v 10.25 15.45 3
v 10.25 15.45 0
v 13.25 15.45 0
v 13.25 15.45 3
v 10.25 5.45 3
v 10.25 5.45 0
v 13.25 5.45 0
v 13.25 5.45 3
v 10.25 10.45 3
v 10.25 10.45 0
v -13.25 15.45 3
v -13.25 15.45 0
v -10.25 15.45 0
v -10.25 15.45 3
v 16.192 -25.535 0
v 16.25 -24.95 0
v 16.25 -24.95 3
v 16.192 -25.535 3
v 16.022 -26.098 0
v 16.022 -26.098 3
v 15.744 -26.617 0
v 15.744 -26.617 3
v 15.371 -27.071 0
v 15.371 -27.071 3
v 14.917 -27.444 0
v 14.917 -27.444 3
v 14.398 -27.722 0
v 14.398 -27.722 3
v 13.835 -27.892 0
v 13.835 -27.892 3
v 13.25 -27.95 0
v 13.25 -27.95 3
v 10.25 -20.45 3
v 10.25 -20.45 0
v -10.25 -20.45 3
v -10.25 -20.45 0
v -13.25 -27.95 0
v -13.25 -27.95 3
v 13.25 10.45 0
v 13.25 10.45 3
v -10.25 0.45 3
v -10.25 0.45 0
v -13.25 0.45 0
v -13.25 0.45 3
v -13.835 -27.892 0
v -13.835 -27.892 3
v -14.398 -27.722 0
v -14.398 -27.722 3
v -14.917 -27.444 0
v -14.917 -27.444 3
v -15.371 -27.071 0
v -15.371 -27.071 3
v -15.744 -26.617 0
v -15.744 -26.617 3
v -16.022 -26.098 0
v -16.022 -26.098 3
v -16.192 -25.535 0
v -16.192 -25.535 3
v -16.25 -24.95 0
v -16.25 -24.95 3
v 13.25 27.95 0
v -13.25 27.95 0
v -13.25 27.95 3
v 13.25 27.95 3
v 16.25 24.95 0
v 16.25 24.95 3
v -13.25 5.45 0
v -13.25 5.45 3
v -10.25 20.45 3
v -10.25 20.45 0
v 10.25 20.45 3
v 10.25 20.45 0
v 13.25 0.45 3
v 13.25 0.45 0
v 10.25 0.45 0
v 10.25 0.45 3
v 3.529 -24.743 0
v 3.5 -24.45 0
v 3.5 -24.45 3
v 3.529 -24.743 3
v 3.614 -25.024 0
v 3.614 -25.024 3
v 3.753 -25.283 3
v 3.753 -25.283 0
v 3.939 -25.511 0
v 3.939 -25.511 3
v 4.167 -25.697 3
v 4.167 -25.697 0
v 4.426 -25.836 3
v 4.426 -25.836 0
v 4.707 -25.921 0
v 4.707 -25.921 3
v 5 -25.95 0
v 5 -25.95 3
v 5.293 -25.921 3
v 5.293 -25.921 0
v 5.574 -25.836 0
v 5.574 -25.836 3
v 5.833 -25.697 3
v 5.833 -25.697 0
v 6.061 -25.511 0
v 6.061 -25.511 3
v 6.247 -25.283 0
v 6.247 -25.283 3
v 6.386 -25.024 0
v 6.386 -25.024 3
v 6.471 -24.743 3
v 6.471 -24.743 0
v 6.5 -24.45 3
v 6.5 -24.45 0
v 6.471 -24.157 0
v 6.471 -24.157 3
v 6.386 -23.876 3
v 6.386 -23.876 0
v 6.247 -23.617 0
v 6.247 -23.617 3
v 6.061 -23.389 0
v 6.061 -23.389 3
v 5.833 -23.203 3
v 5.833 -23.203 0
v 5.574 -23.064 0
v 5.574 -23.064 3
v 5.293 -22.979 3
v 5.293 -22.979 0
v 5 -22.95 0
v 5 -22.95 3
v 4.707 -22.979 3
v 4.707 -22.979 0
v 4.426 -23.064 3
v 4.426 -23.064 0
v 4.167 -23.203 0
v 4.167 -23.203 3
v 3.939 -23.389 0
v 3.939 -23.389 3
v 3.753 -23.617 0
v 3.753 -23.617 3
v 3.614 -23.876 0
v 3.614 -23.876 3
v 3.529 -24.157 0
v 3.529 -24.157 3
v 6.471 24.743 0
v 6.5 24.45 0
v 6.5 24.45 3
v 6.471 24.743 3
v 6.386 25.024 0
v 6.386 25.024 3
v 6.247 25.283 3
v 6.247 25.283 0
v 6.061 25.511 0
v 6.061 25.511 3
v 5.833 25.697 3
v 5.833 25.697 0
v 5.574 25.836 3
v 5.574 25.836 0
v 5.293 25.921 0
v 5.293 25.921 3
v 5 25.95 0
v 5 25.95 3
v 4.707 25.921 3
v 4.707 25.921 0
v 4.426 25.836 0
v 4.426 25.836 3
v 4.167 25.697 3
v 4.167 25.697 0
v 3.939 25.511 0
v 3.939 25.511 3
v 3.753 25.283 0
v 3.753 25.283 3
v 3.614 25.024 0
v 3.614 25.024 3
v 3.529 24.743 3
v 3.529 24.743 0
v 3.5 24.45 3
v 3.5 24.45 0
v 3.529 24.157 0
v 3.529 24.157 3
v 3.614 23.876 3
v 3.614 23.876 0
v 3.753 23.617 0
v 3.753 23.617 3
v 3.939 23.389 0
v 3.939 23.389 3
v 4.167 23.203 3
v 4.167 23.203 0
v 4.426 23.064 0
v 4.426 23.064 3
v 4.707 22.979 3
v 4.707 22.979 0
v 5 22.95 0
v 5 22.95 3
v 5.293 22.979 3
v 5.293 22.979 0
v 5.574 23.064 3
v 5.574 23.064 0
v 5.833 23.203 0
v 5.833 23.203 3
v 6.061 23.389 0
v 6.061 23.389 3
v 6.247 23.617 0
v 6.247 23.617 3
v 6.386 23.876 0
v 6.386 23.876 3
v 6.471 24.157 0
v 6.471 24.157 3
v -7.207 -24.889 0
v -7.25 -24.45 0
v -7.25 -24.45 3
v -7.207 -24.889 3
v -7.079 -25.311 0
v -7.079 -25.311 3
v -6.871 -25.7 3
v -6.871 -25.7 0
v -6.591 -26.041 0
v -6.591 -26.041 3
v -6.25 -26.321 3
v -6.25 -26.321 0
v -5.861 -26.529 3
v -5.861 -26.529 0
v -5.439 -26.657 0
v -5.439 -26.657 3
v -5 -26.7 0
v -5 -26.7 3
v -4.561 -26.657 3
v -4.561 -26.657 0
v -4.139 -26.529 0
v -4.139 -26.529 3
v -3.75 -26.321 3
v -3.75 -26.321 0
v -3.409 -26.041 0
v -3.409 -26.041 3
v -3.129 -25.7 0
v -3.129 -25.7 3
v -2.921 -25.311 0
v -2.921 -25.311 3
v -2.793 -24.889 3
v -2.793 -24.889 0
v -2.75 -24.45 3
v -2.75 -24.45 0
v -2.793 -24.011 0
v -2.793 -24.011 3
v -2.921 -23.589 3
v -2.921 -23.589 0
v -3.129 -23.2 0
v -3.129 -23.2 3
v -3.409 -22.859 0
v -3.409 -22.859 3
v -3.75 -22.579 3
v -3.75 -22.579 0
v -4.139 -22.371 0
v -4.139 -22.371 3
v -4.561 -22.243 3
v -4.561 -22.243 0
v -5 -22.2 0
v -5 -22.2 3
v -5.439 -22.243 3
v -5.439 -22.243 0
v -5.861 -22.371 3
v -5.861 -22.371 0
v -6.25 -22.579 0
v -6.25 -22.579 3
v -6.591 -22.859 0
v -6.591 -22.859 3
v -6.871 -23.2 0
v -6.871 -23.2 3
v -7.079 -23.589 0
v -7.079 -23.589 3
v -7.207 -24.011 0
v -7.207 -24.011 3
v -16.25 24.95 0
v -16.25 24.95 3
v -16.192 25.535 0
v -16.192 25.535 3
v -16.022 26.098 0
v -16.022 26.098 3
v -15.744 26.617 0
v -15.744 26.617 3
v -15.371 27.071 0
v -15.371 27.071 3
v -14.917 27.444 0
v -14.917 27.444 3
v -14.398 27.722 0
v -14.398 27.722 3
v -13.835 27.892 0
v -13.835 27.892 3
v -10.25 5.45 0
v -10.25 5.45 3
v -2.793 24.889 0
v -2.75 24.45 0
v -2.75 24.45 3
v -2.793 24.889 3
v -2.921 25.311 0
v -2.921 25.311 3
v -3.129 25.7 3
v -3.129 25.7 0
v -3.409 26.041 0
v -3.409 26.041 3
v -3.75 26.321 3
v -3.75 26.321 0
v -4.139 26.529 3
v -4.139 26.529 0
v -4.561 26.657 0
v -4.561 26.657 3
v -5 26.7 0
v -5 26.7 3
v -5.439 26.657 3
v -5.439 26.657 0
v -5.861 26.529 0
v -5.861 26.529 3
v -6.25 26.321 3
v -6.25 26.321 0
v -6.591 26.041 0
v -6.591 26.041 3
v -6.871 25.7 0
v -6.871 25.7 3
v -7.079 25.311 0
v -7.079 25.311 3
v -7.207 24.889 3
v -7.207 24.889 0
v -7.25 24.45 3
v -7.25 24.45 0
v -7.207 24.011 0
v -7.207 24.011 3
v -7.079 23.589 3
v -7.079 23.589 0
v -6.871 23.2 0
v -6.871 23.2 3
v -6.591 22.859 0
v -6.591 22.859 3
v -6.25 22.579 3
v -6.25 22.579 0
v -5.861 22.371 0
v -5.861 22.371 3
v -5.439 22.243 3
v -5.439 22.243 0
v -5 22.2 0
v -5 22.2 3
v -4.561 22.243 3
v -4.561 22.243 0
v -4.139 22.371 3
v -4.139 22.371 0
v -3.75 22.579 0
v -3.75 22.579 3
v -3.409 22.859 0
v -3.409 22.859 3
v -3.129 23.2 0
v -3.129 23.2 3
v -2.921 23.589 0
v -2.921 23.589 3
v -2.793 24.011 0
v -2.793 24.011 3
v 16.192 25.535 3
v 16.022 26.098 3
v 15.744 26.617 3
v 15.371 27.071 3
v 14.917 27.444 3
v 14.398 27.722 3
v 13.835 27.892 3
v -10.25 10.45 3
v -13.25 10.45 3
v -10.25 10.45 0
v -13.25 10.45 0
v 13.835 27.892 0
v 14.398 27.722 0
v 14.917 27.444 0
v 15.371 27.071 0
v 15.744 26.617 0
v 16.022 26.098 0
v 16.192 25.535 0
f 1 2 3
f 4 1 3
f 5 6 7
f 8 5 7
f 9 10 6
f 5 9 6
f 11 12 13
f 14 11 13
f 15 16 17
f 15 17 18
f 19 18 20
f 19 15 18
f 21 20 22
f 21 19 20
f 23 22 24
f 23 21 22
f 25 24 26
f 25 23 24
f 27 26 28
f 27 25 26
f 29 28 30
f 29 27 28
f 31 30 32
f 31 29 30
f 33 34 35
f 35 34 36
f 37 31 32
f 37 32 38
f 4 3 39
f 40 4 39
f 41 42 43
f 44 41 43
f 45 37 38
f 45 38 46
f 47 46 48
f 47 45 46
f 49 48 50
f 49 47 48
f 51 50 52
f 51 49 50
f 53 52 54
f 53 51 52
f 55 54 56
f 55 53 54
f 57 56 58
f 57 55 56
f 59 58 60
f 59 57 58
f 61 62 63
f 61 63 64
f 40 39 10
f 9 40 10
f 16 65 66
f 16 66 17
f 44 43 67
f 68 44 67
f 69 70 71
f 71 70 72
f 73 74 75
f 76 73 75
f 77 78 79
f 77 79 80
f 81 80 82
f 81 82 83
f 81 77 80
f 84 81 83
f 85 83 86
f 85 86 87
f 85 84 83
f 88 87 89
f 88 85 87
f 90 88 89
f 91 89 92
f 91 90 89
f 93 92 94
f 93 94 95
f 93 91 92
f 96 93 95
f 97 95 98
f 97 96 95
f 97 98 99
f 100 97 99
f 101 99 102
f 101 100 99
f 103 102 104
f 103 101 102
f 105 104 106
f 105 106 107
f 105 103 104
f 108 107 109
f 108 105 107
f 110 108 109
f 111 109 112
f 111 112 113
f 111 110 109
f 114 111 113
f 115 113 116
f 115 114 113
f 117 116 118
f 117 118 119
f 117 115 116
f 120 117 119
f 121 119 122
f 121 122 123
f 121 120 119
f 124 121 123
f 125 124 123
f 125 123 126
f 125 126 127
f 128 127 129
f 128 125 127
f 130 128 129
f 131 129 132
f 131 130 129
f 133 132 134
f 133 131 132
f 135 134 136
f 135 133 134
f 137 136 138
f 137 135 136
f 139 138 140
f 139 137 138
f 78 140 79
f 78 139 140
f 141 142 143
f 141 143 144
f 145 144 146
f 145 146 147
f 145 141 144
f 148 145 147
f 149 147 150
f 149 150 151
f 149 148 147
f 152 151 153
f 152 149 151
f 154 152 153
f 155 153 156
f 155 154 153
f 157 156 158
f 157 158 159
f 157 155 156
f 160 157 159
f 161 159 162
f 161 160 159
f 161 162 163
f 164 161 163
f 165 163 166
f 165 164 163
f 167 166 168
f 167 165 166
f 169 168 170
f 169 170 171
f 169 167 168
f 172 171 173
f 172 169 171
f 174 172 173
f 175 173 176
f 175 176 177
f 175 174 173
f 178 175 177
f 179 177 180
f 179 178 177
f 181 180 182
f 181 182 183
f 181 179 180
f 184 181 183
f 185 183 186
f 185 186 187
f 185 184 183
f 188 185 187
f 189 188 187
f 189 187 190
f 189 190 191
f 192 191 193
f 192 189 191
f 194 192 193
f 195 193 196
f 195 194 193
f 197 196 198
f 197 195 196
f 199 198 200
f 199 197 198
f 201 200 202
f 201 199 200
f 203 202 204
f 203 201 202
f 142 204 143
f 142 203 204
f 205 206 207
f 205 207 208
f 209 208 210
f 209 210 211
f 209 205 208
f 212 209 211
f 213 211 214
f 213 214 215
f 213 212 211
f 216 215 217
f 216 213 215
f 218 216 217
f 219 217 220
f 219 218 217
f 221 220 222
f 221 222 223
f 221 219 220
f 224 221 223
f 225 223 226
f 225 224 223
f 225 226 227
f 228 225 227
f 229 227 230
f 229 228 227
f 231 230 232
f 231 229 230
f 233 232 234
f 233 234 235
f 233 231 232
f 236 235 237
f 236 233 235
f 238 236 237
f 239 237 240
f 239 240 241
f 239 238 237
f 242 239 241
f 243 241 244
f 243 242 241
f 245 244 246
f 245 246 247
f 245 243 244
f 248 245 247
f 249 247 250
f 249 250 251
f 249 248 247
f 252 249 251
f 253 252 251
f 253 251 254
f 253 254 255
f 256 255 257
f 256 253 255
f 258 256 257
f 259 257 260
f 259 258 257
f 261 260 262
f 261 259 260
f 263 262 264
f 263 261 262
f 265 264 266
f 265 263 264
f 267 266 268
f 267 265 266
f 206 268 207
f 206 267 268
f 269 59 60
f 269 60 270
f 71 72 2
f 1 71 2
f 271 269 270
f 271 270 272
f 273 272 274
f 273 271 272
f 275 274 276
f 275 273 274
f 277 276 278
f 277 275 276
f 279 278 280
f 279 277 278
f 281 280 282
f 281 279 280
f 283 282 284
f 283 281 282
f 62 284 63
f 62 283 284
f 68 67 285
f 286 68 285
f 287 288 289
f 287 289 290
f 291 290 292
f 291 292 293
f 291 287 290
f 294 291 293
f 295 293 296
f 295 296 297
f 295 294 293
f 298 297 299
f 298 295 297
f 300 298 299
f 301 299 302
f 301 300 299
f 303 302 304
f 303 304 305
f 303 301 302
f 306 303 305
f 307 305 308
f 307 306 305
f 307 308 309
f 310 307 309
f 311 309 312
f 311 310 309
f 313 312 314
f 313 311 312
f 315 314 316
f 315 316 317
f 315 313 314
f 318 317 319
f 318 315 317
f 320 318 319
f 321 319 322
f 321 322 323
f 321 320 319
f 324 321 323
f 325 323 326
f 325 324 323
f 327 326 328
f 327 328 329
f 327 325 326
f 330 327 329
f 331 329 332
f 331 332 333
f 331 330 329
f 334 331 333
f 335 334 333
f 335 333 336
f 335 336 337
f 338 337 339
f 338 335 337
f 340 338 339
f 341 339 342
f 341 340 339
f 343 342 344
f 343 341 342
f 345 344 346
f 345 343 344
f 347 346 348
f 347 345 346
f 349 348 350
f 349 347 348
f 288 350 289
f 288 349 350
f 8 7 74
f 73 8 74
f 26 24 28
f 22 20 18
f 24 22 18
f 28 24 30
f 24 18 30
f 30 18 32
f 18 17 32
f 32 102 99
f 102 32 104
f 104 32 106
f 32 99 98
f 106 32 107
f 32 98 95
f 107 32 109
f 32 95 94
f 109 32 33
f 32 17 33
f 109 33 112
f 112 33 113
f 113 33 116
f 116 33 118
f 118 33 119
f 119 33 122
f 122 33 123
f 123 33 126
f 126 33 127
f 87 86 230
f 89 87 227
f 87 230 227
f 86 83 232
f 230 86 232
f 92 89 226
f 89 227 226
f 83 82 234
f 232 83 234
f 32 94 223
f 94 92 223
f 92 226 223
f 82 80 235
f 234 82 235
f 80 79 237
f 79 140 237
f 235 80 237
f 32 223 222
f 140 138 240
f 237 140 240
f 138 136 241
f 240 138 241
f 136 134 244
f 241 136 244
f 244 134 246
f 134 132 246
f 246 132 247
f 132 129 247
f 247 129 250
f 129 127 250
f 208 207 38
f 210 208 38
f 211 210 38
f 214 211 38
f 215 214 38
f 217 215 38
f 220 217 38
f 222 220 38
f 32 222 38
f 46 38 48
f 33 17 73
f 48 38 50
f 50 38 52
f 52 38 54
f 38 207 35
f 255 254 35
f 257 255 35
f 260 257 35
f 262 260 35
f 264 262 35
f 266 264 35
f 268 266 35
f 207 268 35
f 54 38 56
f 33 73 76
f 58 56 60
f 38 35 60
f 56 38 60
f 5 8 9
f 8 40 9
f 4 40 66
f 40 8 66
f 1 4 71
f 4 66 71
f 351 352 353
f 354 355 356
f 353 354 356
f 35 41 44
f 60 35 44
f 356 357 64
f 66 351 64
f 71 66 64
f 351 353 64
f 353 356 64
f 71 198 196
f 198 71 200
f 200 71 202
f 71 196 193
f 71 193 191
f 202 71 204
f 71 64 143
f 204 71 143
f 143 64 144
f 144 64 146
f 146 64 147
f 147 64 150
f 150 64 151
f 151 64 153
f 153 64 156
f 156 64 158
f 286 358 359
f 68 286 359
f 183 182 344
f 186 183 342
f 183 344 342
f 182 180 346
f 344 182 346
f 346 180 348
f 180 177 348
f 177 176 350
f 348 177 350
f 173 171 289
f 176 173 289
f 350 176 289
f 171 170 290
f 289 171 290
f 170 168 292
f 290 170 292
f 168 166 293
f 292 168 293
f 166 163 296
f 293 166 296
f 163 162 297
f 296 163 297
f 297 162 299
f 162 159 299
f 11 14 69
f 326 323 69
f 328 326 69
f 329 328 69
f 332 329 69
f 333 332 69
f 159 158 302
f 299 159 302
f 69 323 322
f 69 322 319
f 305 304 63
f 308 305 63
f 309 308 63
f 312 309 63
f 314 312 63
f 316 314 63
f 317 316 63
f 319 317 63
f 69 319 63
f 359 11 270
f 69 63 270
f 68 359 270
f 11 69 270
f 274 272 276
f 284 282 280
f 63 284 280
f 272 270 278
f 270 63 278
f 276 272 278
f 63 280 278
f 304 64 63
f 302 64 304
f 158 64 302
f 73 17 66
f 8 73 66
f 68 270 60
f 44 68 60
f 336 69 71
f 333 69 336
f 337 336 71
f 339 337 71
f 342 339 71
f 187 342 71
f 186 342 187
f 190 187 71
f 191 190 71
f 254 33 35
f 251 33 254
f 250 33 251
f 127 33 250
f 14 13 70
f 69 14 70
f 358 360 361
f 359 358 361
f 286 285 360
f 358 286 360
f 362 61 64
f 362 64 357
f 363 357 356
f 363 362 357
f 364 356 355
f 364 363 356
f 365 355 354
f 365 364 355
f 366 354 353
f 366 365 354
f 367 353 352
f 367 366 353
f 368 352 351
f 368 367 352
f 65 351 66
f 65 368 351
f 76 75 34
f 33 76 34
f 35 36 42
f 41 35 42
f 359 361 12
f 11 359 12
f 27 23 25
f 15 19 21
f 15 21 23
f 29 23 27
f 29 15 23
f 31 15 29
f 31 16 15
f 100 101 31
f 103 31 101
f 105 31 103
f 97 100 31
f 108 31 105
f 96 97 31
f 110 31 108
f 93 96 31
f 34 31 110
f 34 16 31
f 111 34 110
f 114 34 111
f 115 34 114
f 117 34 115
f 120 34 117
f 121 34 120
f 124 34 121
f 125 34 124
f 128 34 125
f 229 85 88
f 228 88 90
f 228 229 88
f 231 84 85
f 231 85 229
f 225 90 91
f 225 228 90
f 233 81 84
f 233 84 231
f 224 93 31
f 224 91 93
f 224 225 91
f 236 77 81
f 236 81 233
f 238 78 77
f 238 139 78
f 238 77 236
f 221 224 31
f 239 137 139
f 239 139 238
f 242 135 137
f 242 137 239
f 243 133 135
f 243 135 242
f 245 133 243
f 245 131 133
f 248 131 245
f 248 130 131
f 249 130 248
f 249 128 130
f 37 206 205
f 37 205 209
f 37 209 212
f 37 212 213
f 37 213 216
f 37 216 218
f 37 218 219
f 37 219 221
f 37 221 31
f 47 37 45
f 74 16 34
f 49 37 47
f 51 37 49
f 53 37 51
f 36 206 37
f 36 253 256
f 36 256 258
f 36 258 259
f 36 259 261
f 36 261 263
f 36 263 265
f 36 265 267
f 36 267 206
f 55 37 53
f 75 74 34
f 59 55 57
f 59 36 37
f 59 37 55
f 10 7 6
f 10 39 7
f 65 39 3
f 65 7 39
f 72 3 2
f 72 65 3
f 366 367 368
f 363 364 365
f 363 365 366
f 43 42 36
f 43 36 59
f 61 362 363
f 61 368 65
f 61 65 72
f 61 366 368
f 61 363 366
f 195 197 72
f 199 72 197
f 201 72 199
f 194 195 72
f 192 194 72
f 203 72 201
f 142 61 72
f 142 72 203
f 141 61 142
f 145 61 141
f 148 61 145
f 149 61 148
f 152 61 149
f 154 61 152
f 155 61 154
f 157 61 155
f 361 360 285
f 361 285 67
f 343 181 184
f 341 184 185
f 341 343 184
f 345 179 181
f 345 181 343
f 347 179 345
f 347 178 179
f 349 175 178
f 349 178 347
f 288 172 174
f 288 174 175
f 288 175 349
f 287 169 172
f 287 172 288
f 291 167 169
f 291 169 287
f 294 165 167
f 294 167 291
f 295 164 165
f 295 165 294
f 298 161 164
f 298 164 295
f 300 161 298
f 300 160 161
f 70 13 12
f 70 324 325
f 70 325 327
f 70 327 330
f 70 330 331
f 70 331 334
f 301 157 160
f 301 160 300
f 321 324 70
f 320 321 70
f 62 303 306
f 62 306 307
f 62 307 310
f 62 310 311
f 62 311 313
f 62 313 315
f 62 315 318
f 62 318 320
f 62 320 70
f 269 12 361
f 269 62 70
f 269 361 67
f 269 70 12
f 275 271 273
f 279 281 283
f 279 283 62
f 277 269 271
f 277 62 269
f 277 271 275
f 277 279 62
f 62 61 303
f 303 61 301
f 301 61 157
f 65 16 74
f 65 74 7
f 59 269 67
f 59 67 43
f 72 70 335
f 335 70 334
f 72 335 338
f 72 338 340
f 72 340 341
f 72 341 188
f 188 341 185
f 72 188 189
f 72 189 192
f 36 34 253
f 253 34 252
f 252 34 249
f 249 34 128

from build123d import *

# Parameters (mm, degrees)
SKETCH1_R           = 2.25
SKETCH1_R_2         = 1.5
BOSS_EXTRUDE1_DEPTH = 3


with BuildPart() as part:
    # Sketch1 → Boss-Extrude1 (new body)
    with BuildSketch(Plane.XY):
        with BuildLine():
            Line((-13.25, 27.95), (13.25, 27.95))
            ThreePointArc((13.25, 27.95), (15.371320344, 27.071320344), (16.25, 24.95))
            Line((16.25, 24.95), (16.25, -24.95))
            ThreePointArc((16.25, -24.95), (15.371320344, -27.071320344), (13.25, -27.95))
            Line((13.25, -27.95), (-13.25, -27.95))
            ThreePointArc((-13.25, -27.95), (-15.371320344, -27.071320344), (-16.25, -24.95))
            Line((-16.25, -24.95), (-16.25, 24.95))
            ThreePointArc((-16.25, 24.95), (-15.371320344, 27.071320344), (-13.25, 27.95))
        make_face()
        with Locations((-5, 24.45)):
            Circle(SKETCH1_R, mode=Mode.SUBTRACT)
        with Locations((5, 24.45)):
            Circle(SKETCH1_R_2, mode=Mode.SUBTRACT)
        with Locations(Location((5, -24.45, 0), (0, 0, 180))):
            Circle(SKETCH1_R_2, mode=Mode.SUBTRACT)
        with Locations(Location((-5, -24.45, 0), (0, 0, 180))):
            Circle(SKETCH1_R, mode=Mode.SUBTRACT)
        Polygon((-10.25, 20.45), (10.25, 20.45), (10.25, 15.45), (13.25, 15.45), (13.25, 10.45), (10.25, 10.45), (10.25, 5.45), (13.25, 5.45), (13.25, 0.45), (10.25, 0.45), (10.25, -20.45), (-10.25, -20.45), (-10.25, 0.45), (-13.25, 0.45), (-13.25, 5.45), (-10.25, 5.45), (-10.25, 10.45), (-13.25, 10.45), (-13.25, 15.45), (-10.25, 15.45), align=None, mode=Mode.SUBTRACT)
    extrude(amount=BOSS_EXTRUDE1_DEPTH)


solid = part.part
